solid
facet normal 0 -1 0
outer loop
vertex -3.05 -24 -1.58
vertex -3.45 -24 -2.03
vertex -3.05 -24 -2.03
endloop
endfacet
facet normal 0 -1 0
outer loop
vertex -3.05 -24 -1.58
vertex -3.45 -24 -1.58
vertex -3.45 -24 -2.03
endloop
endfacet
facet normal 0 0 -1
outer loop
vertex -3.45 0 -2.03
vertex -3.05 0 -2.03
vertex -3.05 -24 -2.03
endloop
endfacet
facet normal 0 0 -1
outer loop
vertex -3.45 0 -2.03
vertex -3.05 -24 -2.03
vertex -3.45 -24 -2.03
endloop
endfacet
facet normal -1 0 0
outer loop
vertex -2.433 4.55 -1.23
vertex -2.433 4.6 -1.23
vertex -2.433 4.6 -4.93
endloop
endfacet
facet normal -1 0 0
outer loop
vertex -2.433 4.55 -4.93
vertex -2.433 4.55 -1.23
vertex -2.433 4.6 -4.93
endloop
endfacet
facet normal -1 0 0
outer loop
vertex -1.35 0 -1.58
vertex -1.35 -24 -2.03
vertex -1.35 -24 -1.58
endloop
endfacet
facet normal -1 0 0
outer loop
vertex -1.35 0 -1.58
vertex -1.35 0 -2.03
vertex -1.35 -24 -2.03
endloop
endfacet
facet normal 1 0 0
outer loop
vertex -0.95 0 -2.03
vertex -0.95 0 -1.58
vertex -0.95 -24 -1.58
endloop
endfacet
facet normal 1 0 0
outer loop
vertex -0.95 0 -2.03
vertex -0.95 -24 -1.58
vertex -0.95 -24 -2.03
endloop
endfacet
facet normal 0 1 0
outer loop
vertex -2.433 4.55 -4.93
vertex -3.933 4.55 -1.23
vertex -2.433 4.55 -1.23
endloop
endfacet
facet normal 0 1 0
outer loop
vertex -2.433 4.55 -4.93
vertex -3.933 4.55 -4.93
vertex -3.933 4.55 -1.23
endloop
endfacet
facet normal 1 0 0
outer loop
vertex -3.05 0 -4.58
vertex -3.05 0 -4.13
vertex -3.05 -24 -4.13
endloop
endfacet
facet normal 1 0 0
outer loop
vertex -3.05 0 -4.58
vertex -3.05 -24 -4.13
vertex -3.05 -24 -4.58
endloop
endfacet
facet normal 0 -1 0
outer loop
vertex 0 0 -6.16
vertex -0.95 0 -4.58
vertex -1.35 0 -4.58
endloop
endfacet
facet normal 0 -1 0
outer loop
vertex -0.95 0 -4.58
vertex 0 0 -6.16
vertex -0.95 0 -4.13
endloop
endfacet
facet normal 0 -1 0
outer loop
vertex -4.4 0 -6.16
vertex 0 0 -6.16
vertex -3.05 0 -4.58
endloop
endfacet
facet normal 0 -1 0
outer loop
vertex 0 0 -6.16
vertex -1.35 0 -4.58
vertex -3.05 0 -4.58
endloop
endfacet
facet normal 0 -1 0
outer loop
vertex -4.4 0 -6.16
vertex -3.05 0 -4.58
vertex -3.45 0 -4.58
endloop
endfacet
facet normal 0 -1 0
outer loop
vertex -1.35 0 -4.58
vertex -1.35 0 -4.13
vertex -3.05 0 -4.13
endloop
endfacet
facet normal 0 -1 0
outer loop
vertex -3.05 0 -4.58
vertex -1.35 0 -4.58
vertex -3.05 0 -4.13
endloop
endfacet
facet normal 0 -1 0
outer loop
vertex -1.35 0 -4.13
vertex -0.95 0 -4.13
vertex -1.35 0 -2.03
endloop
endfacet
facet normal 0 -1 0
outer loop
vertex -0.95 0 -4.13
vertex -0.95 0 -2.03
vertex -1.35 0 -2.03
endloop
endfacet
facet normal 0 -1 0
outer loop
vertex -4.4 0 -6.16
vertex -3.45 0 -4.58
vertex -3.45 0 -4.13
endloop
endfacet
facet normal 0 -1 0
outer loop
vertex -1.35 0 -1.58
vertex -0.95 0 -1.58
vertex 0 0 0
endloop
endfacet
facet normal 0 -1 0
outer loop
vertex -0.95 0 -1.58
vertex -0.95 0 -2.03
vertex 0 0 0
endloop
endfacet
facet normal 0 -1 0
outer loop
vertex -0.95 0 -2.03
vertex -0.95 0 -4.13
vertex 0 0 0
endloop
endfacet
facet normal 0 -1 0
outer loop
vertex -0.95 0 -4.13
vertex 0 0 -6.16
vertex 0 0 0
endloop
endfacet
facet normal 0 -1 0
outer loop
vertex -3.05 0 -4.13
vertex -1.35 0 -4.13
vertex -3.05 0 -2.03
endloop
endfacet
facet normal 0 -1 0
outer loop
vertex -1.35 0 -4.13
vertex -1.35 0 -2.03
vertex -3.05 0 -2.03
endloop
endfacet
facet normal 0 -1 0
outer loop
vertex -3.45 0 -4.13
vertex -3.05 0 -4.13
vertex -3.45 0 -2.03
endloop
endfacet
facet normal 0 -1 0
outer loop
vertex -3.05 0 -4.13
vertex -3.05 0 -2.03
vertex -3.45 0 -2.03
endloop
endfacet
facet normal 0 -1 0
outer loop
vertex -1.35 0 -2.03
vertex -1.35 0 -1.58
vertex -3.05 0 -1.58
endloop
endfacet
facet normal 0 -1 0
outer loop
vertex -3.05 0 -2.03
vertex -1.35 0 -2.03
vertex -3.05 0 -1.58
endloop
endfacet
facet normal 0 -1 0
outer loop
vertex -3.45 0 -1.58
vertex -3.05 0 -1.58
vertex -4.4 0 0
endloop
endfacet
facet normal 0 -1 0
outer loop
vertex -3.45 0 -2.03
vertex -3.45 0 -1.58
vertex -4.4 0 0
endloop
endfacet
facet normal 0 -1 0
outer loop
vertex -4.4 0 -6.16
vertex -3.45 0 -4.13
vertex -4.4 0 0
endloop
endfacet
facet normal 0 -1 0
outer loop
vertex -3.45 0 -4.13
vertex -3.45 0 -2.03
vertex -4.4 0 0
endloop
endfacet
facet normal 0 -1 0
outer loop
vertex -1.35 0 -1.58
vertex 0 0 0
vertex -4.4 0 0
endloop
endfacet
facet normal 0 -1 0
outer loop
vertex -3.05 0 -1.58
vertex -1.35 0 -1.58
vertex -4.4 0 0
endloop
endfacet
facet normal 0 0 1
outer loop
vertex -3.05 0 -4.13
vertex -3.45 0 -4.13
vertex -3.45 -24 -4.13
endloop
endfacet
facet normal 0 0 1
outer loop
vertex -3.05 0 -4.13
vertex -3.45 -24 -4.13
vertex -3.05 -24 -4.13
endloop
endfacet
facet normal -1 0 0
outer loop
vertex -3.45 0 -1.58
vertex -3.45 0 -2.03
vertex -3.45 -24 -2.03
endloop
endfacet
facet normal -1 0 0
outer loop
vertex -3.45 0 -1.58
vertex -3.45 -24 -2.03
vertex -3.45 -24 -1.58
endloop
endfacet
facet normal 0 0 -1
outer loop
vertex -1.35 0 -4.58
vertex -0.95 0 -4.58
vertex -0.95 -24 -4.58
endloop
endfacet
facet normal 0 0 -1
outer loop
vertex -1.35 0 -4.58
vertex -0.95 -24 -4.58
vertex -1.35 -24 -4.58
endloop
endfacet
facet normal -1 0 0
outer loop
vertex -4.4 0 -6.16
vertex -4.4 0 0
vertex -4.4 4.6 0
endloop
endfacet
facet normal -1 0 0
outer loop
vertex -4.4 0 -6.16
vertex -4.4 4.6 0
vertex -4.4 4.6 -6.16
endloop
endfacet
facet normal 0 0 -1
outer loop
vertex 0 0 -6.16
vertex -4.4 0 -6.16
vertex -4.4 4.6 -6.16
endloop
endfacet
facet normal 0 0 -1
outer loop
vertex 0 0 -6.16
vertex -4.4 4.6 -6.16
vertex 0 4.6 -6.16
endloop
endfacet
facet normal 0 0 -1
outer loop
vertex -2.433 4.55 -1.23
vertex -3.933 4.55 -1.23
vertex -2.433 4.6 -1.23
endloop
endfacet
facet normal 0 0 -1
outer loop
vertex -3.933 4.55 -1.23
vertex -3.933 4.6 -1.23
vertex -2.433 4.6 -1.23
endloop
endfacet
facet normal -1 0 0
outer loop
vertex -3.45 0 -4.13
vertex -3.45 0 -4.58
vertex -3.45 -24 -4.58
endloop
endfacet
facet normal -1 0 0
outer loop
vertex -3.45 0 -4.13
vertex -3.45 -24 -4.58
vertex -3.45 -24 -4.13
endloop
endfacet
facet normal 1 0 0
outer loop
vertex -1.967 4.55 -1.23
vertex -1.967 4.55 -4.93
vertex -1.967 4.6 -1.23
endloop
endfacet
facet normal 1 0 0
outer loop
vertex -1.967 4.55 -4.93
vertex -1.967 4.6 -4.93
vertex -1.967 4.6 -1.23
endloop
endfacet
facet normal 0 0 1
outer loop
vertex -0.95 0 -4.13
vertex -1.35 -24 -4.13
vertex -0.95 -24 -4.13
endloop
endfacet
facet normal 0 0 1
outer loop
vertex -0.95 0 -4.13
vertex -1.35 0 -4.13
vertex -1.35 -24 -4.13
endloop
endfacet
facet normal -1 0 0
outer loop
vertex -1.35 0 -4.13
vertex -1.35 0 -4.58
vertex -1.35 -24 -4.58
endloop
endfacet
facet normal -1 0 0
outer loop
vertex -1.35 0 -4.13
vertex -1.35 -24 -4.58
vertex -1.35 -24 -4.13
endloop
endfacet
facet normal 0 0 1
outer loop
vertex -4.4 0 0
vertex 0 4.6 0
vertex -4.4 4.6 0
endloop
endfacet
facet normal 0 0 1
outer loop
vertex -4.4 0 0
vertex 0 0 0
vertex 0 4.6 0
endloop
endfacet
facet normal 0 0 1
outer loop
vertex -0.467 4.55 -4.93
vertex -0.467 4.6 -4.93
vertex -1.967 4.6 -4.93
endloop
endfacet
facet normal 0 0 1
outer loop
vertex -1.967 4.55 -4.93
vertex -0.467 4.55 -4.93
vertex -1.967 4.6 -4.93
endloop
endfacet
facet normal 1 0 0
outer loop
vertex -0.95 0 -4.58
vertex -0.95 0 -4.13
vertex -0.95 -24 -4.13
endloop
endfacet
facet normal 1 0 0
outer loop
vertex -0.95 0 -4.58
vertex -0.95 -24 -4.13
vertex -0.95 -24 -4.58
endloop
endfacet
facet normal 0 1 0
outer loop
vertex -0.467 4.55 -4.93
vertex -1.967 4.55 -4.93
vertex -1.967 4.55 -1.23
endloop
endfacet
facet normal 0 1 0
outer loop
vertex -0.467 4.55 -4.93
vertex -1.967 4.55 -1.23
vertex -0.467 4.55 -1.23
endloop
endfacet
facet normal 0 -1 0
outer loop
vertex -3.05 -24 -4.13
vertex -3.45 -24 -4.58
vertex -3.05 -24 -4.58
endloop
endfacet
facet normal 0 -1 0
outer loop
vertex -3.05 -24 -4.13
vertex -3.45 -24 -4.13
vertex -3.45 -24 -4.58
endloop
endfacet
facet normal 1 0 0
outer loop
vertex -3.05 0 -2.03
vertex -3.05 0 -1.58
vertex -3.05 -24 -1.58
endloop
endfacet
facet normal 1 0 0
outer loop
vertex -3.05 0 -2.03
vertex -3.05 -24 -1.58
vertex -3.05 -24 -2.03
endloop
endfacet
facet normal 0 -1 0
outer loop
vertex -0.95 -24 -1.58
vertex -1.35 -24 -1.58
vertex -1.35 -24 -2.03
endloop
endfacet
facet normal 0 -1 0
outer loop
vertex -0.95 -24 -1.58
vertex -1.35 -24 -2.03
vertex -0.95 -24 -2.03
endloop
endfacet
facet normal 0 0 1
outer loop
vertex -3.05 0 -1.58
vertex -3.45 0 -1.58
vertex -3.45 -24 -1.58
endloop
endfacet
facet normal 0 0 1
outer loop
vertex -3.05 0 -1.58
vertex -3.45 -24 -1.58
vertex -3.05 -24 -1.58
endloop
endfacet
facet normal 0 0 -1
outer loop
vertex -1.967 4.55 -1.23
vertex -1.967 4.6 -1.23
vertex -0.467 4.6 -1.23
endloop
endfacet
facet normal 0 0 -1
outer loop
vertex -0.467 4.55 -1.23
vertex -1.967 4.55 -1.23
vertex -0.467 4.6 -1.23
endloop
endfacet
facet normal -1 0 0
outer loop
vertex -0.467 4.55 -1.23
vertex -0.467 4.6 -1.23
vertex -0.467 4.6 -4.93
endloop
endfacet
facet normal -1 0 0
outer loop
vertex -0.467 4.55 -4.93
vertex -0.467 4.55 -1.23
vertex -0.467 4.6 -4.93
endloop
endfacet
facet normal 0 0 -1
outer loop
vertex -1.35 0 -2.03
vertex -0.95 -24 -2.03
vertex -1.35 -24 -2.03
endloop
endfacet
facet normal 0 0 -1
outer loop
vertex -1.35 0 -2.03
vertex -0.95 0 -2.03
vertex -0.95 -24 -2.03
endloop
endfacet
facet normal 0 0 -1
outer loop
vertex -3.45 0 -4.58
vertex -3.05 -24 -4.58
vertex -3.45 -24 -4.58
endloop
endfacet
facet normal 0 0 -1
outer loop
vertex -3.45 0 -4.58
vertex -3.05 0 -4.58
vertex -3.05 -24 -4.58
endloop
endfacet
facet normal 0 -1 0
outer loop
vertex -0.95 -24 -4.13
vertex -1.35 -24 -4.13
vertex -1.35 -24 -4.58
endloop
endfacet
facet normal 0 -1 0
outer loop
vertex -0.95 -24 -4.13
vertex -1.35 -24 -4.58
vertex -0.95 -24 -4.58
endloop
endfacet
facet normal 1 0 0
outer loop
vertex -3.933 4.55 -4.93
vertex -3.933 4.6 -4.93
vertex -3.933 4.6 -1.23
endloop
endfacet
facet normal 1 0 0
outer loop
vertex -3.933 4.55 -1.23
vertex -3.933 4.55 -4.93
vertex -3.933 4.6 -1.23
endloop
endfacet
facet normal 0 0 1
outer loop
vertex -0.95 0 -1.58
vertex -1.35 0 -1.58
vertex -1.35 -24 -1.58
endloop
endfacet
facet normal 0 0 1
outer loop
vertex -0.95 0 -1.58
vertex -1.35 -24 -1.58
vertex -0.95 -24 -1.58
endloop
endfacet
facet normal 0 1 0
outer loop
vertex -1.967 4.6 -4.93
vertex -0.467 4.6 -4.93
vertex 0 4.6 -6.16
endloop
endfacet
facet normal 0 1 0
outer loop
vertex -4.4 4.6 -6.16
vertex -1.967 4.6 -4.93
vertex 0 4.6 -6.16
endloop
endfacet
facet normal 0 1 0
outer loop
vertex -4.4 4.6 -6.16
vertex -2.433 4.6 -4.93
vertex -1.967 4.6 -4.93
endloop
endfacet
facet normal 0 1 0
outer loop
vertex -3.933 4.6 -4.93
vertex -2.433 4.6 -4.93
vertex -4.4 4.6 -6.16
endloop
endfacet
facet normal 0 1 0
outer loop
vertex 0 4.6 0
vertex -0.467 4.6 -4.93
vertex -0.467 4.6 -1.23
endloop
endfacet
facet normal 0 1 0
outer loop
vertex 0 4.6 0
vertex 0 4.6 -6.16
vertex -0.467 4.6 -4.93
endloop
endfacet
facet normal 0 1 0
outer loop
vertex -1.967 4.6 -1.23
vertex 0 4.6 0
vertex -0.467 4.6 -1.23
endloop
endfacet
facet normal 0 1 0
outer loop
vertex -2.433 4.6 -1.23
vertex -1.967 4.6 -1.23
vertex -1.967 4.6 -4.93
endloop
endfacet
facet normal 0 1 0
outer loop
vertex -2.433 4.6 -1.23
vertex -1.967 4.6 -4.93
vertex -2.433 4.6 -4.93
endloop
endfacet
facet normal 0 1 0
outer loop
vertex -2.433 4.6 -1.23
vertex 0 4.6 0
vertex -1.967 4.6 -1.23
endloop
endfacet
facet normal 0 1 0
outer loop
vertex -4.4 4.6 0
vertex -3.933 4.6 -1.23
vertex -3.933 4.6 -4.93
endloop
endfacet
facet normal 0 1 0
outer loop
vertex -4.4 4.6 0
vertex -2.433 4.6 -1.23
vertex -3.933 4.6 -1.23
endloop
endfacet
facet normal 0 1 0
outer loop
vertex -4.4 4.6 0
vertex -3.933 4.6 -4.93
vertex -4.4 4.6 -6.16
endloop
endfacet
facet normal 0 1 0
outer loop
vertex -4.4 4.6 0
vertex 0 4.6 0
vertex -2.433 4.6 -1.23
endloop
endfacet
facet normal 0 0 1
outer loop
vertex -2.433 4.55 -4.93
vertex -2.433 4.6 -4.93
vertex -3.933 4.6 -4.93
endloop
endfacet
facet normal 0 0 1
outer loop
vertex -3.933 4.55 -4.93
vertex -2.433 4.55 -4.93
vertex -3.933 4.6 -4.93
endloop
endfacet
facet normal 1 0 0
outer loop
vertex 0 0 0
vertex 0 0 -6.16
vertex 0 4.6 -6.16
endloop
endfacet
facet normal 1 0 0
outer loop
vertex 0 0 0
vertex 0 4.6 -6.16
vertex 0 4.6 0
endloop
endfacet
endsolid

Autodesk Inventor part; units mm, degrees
ref_plane "YZ Plane" through (0, 0, 0) normal (1, 0, 0) x (0, 1, 0)
ref_plane "XZ Plane" through (0, 0, 0) normal (0, 1, 0) x (-1, 0, 0)
ref_plane "XY Plane" through (0, 0, 0) normal (0, 0, 1) x (1, 0, 0)
sketch "Sketch1" plane through (0, 0, 0) normal (0, 1, 0) x (-1, 0, 0)
  line L0 (0, 0) -> (4.4, 0)
  line L1 (4.4, 0) -> (4.4, -6.16)
  line L2 (4.4, -6.16) -> (0, -6.16)
  line L3 (0, -6.16) -> (0, 0)
  dimension "d0" = 6.16
  dimension "d1" = 4.4
extrude "Extrusion1" add sketch "Sketch1" along normal blind 4.6
sketch "Sketch2" plane through (0, 4.6, 0) normal (0, 1, 0) x (1, 0, 0)
  line L0 (-3.9333, 1.23) -> (-2.4333, 1.23)
  line L1 (-2.4333, 1.23) -> (-2.4333, 4.93)
  line L2 (-2.4333, 4.93) -> (-3.9333, 4.93)
  line L3 (-3.9333, 4.93) -> (-3.9333, 1.23)
  line L4 (-1.9667, 1.23) -> (-0.4667, 1.23)
  line L5 (-0.4667, 1.23) -> (-0.4667, 4.93)
  line L6 (-0.4667, 4.93) -> (-1.9667, 4.93)
  line L7 (-1.9667, 4.93) -> (-1.9667, 1.23)
  line L8 (-4.4, 0) -> (0, 0) projected
  line L9 (0, 0) -> (0, 6.16) projected
  line L10 (0, 6.16) -> (-4.4, 6.16) projected
  line L11 (-4.4, 6.16) -> (-4.4, 0) projected
  dimension "d4" = 3.7
  dimension "d5" = 1.5
  dimension "d6" = 4.4
  dimension "d7" = 0.4667
  dimension "d8" = 0.4667
  dimension "d9" = 6.16
  dimension "d10" = 1.23
extrude "Extrusion2" cut sketch "Sketch2" against normal blind 0.05 contours L3 L2 L1 L0 | L7 L6 L5 L4
sketch "Sketch4" plane through (0, 0, 0) normal (0, -1, 0) x (1, 0, 0)
  line L0 (-3.45, -1.58) -> (-3.05, -1.58)
  line L1 (-3.05, -1.58) -> (-3.05, -2.03)
  line L2 (-3.05, -2.03) -> (-3.45, -2.03)
  line L3 (-3.45, -2.03) -> (-3.45, -1.58)
  line L4 (-1.35, -1.58) -> (-0.95, -1.58)
  line L5 (-0.95, -1.58) -> (-0.95, -2.03)
  line L6 (-0.95, -2.03) -> (-1.35, -2.03)
  line L7 (-1.35, -2.03) -> (-1.35, -1.58)
  line L8 (-3.45, -4.13) -> (-3.05, -4.13)
  line L9 (-3.05, -4.13) -> (-3.05, -4.58)
  line L10 (-3.05, -4.58) -> (-3.45, -4.58)
  line L11 (-3.45, -4.58) -> (-3.45, -4.13)
  line L12 (-1.35, -4.13) -> (-0.95, -4.13)
  line L13 (-0.95, -4.13) -> (-0.95, -4.58)
  line L14 (-0.95, -4.58) -> (-1.35, -4.58)
  line L15 (-1.35, -4.58) -> (-1.35, -4.13)
  line L16 (0, 0) -> (-4.4, 0) projected
  line L17 (-4.4, 0) -> (-4.4, -6.16) projected
  line L18 (-4.4, -6.16) -> (0, -6.16) projected
  line L19 (0, -6.16) -> (0, 0) projected
  dimension "d13" = 0.45
  dimension "d14" = 0.4
  dimension "d15" = 2.5
  dimension "d16" = 3
  dimension "d17" = 4.4
  dimension "d18" = 6.16
  dimension "d19" = 1.58
  dimension "d20" = 0.95
extrude "Extrusion3" add sketch "Sketch4" along normal blind 24 contours L0 L1 L2 L3 | L4 L5 L6 L7 | L8 L9 L10 L11 | L12 L13 L14 L15
equation "\"d7\" = -0.666667 * d5 + 0.333333 * d6"
equation "\"d8\" = d7"
equation "\"d10\" = -0.5 * d4 + 0.5 * d9"
equation "\"d19\" = -0.5 * d16 + 0.5 * d18"
equation "\"d20\" = -0.5 * d15 + 0.5 * d17"
properties part number "LineSensor"
